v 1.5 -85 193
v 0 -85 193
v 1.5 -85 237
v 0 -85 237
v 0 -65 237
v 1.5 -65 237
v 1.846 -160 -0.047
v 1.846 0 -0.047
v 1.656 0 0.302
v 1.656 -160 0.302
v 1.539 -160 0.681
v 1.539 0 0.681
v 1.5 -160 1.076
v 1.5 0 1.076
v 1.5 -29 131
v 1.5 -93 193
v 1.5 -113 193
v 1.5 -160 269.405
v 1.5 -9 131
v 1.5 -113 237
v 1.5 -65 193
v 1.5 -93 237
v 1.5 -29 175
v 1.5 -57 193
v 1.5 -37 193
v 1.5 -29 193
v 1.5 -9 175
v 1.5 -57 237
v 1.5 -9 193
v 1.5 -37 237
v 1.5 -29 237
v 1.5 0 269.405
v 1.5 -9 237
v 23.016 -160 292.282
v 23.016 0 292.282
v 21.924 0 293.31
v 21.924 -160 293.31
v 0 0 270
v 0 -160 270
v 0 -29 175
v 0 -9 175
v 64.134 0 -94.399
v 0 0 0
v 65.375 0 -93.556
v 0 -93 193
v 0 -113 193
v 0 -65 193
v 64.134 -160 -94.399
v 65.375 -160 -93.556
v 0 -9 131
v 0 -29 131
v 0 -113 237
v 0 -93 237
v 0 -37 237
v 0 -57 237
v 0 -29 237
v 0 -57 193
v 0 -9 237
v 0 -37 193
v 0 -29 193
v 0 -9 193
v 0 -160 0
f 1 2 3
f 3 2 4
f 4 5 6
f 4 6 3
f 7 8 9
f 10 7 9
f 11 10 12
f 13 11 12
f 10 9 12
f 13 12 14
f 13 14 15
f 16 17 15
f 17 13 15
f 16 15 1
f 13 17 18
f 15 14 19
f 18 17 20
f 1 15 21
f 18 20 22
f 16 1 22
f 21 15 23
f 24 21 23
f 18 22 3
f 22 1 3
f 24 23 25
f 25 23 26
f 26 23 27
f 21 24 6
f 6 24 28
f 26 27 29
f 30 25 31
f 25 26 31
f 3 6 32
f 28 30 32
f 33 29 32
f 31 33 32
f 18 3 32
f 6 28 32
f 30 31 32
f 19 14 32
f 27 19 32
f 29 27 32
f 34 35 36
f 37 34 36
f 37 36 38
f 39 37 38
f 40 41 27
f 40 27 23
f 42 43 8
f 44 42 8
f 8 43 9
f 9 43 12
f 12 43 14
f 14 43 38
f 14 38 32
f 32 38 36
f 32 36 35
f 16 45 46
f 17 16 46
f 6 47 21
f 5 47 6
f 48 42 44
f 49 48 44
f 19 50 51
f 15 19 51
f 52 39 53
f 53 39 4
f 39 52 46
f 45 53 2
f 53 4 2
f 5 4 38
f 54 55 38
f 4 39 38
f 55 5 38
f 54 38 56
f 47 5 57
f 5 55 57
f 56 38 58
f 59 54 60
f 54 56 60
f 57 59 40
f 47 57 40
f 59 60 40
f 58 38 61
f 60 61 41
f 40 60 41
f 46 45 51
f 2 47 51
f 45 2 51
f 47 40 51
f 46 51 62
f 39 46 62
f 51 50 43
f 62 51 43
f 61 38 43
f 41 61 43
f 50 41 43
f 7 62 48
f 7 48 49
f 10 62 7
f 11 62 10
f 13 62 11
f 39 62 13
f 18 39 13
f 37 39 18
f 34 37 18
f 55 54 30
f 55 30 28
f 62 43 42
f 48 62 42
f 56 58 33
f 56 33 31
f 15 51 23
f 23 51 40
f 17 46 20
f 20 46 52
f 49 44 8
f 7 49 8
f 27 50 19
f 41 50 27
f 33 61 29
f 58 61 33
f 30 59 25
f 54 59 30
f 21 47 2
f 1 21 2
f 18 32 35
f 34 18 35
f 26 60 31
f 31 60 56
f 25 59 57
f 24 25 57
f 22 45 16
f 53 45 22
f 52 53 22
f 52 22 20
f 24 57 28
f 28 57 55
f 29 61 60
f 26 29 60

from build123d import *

# Parameters (mm, degrees)
F1_DEPTH = 160
F2_W     = 20
F2_H     = 44
F3_DEPTH = 65.375966


with BuildPart() as f1:
    # F0 (on Front) → F1 (new body)
    with BuildSketch(Plane.XZ):
        with BuildLine():
            Line((0, 270), (0, 0))
            Line((0, 0), (64.134226, -94.399233))
            Line((64.134226, -94.399233), (65.374966, -93.556283))
            Line((65.374966, -93.556283), (1.845681, -0.047463))
            ThreePointArc((1.845681, -0.047463), (1.588373, 0.488525), (1.5, 1.076471))
            Line((1.5, 1.076471), (1.5, 269.405426))
            Line((1.5, 269.405426), (23.016468, 292.282105))
            Line((23.016468, 292.282105), (21.923822, 293.309784))
            Line((21.923822, 293.309784), (0, 270))
        make_face()
    extrude(amount=F1_DEPTH)

    # F2 (on face) → F3 (cut, through all)
    with BuildSketch(Plane(origin=(0, 0, 0), x_dir=(0, -1, 0), z_dir=(-1, 0, 0))):
        with Locations((19, 215)):
            Rectangle(F2_W, F2_H)
        with Locations((47, 215)):
            Rectangle(F2_W, F2_H)
        with Locations((75, 215)):
            Rectangle(F2_W, F2_H)
        with Locations((103, 215)):
            Rectangle(F2_W, F2_H)
        with Locations((19, 153)):
            Rectangle(F2_W, F2_H)
    extrude(amount=-F3_DEPTH, mode=Mode.SUBTRACT)


solid = f1.part
